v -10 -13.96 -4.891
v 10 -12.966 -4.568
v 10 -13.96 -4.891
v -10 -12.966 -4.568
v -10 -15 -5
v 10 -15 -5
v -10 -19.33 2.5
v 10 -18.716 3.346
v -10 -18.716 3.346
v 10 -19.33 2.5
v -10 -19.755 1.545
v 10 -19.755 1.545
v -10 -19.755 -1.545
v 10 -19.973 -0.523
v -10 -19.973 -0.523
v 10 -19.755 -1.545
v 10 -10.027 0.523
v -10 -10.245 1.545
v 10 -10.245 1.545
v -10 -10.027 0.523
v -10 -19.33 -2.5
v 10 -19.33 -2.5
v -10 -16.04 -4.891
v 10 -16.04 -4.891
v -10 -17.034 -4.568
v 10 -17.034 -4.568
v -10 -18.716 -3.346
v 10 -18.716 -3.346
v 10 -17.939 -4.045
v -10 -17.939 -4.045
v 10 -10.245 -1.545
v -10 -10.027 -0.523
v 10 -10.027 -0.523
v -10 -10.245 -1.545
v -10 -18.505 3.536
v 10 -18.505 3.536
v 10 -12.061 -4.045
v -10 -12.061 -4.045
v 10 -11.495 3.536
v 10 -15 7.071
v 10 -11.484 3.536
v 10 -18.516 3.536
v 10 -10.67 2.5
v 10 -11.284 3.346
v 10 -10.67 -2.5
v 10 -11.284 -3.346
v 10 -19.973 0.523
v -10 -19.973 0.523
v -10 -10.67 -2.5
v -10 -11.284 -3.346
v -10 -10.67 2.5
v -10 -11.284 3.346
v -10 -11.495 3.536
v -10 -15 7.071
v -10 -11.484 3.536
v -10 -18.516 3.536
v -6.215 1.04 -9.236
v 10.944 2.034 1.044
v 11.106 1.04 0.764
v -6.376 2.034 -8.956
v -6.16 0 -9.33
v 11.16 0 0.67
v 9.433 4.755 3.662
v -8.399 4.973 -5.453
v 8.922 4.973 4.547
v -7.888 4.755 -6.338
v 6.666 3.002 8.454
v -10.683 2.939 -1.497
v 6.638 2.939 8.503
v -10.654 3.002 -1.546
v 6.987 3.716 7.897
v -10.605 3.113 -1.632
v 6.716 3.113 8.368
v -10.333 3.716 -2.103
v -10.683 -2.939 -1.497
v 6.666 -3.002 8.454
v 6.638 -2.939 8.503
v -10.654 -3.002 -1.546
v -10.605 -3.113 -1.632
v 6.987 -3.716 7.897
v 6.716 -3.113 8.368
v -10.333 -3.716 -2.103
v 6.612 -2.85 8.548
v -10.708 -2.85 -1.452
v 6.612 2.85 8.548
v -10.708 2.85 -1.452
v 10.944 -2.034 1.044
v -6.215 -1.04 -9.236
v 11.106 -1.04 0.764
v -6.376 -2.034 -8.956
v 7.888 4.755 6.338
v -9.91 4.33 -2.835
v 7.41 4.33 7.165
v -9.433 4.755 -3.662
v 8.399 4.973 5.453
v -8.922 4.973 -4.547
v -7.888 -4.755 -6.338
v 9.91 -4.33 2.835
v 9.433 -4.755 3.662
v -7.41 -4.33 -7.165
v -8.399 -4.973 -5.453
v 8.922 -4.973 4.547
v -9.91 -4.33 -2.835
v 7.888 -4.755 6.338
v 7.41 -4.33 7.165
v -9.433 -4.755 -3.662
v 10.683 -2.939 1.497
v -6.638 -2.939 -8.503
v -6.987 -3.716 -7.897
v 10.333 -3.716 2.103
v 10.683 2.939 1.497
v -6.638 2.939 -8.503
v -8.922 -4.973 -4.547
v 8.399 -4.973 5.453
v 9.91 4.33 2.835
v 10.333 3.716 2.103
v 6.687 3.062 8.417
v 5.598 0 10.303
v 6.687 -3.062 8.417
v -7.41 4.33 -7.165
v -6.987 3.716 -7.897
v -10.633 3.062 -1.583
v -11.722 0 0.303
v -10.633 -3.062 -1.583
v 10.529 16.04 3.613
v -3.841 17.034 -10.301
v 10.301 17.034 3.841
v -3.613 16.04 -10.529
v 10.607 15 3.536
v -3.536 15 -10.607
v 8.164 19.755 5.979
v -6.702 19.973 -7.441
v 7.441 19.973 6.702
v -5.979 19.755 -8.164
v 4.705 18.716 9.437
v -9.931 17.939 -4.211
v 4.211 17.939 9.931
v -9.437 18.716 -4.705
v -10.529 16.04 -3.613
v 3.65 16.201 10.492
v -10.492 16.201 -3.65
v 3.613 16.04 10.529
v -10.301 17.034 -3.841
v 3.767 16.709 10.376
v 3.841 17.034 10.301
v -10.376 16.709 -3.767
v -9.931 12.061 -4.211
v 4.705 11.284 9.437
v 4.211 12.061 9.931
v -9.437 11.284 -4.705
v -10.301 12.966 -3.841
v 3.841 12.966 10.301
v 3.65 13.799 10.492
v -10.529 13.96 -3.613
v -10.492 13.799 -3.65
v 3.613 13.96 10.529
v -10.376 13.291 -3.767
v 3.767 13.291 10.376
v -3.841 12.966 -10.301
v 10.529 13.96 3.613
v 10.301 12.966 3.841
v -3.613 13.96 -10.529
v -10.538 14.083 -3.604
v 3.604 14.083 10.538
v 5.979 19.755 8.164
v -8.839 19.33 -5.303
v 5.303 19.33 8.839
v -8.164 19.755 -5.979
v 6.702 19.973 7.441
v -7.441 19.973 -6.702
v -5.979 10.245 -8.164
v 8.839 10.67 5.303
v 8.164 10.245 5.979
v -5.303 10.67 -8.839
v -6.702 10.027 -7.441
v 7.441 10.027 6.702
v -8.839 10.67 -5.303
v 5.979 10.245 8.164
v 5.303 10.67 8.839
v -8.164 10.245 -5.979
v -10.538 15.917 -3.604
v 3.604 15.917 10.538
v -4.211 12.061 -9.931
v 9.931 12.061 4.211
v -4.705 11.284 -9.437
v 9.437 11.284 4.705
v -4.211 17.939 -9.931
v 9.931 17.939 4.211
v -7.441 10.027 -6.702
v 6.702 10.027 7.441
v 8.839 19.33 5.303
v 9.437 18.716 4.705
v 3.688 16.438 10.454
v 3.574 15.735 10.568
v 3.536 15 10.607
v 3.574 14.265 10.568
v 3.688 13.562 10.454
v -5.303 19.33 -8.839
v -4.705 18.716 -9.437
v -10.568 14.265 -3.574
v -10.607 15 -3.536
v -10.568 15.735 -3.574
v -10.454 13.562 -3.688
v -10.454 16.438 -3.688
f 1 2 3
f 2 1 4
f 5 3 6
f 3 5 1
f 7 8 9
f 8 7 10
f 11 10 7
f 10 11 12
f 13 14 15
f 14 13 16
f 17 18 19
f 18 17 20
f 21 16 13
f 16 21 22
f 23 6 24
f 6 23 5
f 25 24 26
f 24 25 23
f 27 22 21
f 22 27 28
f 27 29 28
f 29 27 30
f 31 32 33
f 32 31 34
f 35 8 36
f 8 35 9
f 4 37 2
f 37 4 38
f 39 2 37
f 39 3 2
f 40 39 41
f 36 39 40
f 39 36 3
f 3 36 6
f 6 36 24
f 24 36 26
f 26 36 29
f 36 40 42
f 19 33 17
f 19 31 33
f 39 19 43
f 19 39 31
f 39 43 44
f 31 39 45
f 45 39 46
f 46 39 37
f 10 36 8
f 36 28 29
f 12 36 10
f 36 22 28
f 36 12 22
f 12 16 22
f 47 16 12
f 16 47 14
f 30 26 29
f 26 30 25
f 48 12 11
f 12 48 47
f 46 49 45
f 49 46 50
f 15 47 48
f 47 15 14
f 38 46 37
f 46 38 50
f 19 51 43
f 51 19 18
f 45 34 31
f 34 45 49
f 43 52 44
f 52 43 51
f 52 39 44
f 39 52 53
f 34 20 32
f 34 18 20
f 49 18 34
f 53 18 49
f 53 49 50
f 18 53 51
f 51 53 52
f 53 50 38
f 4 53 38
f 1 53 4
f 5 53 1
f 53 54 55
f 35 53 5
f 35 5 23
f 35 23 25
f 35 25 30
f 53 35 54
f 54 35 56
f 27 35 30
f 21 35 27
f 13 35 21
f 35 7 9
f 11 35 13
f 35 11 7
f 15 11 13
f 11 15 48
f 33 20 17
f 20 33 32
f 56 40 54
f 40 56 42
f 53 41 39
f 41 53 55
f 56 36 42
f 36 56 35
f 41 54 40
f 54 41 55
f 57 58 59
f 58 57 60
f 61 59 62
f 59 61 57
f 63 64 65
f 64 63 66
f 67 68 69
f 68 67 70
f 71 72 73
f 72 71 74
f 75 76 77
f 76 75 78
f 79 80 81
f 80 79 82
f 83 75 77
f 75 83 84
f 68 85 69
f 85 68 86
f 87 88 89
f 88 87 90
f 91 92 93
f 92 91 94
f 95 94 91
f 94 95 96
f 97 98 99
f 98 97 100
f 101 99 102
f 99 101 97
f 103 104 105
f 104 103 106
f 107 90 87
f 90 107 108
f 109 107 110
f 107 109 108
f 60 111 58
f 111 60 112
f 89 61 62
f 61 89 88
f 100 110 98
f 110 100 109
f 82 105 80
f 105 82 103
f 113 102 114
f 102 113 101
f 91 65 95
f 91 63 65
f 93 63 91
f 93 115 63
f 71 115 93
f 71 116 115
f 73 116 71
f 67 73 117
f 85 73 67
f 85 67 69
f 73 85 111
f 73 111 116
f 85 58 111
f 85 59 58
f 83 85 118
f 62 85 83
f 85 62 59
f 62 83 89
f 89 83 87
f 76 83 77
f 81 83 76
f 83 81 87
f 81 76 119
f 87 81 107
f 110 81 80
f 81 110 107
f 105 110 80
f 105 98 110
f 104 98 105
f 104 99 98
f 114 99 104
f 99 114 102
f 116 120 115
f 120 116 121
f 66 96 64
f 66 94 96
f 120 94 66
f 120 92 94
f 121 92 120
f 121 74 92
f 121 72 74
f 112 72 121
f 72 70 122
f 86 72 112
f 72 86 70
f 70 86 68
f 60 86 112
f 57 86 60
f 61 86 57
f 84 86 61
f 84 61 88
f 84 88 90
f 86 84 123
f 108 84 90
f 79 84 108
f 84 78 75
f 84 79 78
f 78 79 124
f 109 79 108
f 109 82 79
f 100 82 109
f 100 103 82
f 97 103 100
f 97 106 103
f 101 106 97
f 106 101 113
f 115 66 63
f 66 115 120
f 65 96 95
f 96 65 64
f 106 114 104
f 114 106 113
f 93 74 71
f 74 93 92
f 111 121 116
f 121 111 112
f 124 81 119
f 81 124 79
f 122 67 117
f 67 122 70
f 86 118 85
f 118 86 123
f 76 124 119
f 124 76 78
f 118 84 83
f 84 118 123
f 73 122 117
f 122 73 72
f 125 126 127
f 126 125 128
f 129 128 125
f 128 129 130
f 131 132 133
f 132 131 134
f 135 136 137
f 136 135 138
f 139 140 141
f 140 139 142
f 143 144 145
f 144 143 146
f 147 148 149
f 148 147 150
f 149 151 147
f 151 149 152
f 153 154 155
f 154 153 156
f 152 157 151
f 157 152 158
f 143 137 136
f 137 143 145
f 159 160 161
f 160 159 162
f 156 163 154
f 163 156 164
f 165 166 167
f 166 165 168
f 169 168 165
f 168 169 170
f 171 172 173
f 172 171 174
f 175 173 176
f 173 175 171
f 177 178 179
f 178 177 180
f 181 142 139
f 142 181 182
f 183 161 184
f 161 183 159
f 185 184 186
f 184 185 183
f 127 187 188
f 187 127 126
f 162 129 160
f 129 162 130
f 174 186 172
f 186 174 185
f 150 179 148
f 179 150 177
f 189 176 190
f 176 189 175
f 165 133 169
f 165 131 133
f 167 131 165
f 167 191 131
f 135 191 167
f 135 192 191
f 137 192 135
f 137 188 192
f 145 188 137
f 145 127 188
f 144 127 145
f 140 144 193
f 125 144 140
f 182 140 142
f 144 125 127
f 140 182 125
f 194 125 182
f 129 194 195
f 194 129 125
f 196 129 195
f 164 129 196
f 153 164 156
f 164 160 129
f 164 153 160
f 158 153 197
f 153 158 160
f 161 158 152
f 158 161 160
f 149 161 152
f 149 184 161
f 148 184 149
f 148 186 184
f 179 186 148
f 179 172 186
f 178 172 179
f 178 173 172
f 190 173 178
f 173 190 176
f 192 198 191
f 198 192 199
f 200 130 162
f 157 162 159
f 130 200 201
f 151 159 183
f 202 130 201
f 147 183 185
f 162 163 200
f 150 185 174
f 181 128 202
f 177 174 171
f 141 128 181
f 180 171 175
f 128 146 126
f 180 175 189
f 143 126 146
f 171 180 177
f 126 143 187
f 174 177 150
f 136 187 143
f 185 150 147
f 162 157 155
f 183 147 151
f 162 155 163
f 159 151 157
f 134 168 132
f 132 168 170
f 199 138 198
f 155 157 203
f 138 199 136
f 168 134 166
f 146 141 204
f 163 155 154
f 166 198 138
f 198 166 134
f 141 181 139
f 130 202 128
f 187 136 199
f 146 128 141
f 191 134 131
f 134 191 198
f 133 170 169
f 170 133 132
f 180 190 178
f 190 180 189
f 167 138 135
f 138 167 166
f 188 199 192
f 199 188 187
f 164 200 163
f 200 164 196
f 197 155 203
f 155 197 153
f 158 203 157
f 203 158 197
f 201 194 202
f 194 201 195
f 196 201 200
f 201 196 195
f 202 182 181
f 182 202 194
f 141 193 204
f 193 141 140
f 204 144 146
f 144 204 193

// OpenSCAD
/* From http://www.thingiverse.com/thing:3457
   © 2010 whosawhatsis

   This program is free software: you can redistribute it and/or modify
   it under the terms of the GNU Lesser General Public License as published by
   the Free Software Foundation, either version 3 of the License, or
   (at your option) any later version.

   This program is distributed in the hope that it will be useful,
   but WITHOUT ANY WARRANTY; without even the implied warranty of
   MERCHANTABILITY or FITNESS FOR A PARTICULAR PURPOSE. See the
   GNU Lesser General Public License for more details.

   You should have received a copy of the GNU Lesser General Public License
   along with this program. If not, see <http://www.gnu.org/licenses/>.
*/


/*
This script generates a teardrop shape at the appropriate angle to prevent overhangs greater than 45 degrees. The angle is in degrees, and is a rotation around the Y axis. You can then rotate around Z to point it in any direction. Rotation around X or Y will cause the angle to be wrong.
*/

module teardrop(radius, length, angle) {
	rotate([0, angle, 0]) union() {
		linear_extrude(height = length, center = true, convexity = radius, twist = 0)
			circle(r = radius, center = true, $fn = 30);
		linear_extrude(height = length, center = true, convexity = radius, twist = 0)
			projection(cut = false) rotate([0, -angle, 0]) translate([0, 0, radius * sin(45) * 1.5]) cylinder(h = radius * sin(45), r1 = radius * sin(45), r2 = 0, center = true, $fn = 30);
	}
		
	//I worked this portion out when a bug was causing the projection above to take FOREVER to calculate. It works as a replacement, and I figured I'd leave it here just in case.
	/*
		#polygon(points = [[radius * cos(-angle / 2), radius * sin(-angle / 2), 0],[radius * cos(-angle / 2), radius * -sin(-angle / 2), 0],[(sin(-angle - 45) + cos(-angle - 45)) * radius, 0, 0]], paths = [[0, 1, 2]]);
		#polygon(points = [[radius * -cos(-angle / 2), radius * sin(-angle / 2), 0],[radius * -cos(-angle / 2), radius * -sin(-angle / 2), 0],[(sin(-angle - 45) + cos(-angle - 45)) * radius, 0, 0]], paths = [[0, 1, 2]]);
		#polygon(points = [[radius * sin(-angle / 2), radius * cos(-angle / 2), 0],[radius * sin(-angle / 2), radius * -cos(-angle / 2), 0],[(sin(-angle - 45) + cos(-angle - 45)) * radius, 0, 0]], paths = [[0, 1, 2]]);
	*/
}

module test_teardrop(){
    translate([0, -15, 0]) teardrop(5, 20, 90);
    translate([0, 0, 0]) teardrop(5, 20, 60);
    translate([0, 15, 0]) teardrop(5, 20, 45);
}

test_teardrop();
